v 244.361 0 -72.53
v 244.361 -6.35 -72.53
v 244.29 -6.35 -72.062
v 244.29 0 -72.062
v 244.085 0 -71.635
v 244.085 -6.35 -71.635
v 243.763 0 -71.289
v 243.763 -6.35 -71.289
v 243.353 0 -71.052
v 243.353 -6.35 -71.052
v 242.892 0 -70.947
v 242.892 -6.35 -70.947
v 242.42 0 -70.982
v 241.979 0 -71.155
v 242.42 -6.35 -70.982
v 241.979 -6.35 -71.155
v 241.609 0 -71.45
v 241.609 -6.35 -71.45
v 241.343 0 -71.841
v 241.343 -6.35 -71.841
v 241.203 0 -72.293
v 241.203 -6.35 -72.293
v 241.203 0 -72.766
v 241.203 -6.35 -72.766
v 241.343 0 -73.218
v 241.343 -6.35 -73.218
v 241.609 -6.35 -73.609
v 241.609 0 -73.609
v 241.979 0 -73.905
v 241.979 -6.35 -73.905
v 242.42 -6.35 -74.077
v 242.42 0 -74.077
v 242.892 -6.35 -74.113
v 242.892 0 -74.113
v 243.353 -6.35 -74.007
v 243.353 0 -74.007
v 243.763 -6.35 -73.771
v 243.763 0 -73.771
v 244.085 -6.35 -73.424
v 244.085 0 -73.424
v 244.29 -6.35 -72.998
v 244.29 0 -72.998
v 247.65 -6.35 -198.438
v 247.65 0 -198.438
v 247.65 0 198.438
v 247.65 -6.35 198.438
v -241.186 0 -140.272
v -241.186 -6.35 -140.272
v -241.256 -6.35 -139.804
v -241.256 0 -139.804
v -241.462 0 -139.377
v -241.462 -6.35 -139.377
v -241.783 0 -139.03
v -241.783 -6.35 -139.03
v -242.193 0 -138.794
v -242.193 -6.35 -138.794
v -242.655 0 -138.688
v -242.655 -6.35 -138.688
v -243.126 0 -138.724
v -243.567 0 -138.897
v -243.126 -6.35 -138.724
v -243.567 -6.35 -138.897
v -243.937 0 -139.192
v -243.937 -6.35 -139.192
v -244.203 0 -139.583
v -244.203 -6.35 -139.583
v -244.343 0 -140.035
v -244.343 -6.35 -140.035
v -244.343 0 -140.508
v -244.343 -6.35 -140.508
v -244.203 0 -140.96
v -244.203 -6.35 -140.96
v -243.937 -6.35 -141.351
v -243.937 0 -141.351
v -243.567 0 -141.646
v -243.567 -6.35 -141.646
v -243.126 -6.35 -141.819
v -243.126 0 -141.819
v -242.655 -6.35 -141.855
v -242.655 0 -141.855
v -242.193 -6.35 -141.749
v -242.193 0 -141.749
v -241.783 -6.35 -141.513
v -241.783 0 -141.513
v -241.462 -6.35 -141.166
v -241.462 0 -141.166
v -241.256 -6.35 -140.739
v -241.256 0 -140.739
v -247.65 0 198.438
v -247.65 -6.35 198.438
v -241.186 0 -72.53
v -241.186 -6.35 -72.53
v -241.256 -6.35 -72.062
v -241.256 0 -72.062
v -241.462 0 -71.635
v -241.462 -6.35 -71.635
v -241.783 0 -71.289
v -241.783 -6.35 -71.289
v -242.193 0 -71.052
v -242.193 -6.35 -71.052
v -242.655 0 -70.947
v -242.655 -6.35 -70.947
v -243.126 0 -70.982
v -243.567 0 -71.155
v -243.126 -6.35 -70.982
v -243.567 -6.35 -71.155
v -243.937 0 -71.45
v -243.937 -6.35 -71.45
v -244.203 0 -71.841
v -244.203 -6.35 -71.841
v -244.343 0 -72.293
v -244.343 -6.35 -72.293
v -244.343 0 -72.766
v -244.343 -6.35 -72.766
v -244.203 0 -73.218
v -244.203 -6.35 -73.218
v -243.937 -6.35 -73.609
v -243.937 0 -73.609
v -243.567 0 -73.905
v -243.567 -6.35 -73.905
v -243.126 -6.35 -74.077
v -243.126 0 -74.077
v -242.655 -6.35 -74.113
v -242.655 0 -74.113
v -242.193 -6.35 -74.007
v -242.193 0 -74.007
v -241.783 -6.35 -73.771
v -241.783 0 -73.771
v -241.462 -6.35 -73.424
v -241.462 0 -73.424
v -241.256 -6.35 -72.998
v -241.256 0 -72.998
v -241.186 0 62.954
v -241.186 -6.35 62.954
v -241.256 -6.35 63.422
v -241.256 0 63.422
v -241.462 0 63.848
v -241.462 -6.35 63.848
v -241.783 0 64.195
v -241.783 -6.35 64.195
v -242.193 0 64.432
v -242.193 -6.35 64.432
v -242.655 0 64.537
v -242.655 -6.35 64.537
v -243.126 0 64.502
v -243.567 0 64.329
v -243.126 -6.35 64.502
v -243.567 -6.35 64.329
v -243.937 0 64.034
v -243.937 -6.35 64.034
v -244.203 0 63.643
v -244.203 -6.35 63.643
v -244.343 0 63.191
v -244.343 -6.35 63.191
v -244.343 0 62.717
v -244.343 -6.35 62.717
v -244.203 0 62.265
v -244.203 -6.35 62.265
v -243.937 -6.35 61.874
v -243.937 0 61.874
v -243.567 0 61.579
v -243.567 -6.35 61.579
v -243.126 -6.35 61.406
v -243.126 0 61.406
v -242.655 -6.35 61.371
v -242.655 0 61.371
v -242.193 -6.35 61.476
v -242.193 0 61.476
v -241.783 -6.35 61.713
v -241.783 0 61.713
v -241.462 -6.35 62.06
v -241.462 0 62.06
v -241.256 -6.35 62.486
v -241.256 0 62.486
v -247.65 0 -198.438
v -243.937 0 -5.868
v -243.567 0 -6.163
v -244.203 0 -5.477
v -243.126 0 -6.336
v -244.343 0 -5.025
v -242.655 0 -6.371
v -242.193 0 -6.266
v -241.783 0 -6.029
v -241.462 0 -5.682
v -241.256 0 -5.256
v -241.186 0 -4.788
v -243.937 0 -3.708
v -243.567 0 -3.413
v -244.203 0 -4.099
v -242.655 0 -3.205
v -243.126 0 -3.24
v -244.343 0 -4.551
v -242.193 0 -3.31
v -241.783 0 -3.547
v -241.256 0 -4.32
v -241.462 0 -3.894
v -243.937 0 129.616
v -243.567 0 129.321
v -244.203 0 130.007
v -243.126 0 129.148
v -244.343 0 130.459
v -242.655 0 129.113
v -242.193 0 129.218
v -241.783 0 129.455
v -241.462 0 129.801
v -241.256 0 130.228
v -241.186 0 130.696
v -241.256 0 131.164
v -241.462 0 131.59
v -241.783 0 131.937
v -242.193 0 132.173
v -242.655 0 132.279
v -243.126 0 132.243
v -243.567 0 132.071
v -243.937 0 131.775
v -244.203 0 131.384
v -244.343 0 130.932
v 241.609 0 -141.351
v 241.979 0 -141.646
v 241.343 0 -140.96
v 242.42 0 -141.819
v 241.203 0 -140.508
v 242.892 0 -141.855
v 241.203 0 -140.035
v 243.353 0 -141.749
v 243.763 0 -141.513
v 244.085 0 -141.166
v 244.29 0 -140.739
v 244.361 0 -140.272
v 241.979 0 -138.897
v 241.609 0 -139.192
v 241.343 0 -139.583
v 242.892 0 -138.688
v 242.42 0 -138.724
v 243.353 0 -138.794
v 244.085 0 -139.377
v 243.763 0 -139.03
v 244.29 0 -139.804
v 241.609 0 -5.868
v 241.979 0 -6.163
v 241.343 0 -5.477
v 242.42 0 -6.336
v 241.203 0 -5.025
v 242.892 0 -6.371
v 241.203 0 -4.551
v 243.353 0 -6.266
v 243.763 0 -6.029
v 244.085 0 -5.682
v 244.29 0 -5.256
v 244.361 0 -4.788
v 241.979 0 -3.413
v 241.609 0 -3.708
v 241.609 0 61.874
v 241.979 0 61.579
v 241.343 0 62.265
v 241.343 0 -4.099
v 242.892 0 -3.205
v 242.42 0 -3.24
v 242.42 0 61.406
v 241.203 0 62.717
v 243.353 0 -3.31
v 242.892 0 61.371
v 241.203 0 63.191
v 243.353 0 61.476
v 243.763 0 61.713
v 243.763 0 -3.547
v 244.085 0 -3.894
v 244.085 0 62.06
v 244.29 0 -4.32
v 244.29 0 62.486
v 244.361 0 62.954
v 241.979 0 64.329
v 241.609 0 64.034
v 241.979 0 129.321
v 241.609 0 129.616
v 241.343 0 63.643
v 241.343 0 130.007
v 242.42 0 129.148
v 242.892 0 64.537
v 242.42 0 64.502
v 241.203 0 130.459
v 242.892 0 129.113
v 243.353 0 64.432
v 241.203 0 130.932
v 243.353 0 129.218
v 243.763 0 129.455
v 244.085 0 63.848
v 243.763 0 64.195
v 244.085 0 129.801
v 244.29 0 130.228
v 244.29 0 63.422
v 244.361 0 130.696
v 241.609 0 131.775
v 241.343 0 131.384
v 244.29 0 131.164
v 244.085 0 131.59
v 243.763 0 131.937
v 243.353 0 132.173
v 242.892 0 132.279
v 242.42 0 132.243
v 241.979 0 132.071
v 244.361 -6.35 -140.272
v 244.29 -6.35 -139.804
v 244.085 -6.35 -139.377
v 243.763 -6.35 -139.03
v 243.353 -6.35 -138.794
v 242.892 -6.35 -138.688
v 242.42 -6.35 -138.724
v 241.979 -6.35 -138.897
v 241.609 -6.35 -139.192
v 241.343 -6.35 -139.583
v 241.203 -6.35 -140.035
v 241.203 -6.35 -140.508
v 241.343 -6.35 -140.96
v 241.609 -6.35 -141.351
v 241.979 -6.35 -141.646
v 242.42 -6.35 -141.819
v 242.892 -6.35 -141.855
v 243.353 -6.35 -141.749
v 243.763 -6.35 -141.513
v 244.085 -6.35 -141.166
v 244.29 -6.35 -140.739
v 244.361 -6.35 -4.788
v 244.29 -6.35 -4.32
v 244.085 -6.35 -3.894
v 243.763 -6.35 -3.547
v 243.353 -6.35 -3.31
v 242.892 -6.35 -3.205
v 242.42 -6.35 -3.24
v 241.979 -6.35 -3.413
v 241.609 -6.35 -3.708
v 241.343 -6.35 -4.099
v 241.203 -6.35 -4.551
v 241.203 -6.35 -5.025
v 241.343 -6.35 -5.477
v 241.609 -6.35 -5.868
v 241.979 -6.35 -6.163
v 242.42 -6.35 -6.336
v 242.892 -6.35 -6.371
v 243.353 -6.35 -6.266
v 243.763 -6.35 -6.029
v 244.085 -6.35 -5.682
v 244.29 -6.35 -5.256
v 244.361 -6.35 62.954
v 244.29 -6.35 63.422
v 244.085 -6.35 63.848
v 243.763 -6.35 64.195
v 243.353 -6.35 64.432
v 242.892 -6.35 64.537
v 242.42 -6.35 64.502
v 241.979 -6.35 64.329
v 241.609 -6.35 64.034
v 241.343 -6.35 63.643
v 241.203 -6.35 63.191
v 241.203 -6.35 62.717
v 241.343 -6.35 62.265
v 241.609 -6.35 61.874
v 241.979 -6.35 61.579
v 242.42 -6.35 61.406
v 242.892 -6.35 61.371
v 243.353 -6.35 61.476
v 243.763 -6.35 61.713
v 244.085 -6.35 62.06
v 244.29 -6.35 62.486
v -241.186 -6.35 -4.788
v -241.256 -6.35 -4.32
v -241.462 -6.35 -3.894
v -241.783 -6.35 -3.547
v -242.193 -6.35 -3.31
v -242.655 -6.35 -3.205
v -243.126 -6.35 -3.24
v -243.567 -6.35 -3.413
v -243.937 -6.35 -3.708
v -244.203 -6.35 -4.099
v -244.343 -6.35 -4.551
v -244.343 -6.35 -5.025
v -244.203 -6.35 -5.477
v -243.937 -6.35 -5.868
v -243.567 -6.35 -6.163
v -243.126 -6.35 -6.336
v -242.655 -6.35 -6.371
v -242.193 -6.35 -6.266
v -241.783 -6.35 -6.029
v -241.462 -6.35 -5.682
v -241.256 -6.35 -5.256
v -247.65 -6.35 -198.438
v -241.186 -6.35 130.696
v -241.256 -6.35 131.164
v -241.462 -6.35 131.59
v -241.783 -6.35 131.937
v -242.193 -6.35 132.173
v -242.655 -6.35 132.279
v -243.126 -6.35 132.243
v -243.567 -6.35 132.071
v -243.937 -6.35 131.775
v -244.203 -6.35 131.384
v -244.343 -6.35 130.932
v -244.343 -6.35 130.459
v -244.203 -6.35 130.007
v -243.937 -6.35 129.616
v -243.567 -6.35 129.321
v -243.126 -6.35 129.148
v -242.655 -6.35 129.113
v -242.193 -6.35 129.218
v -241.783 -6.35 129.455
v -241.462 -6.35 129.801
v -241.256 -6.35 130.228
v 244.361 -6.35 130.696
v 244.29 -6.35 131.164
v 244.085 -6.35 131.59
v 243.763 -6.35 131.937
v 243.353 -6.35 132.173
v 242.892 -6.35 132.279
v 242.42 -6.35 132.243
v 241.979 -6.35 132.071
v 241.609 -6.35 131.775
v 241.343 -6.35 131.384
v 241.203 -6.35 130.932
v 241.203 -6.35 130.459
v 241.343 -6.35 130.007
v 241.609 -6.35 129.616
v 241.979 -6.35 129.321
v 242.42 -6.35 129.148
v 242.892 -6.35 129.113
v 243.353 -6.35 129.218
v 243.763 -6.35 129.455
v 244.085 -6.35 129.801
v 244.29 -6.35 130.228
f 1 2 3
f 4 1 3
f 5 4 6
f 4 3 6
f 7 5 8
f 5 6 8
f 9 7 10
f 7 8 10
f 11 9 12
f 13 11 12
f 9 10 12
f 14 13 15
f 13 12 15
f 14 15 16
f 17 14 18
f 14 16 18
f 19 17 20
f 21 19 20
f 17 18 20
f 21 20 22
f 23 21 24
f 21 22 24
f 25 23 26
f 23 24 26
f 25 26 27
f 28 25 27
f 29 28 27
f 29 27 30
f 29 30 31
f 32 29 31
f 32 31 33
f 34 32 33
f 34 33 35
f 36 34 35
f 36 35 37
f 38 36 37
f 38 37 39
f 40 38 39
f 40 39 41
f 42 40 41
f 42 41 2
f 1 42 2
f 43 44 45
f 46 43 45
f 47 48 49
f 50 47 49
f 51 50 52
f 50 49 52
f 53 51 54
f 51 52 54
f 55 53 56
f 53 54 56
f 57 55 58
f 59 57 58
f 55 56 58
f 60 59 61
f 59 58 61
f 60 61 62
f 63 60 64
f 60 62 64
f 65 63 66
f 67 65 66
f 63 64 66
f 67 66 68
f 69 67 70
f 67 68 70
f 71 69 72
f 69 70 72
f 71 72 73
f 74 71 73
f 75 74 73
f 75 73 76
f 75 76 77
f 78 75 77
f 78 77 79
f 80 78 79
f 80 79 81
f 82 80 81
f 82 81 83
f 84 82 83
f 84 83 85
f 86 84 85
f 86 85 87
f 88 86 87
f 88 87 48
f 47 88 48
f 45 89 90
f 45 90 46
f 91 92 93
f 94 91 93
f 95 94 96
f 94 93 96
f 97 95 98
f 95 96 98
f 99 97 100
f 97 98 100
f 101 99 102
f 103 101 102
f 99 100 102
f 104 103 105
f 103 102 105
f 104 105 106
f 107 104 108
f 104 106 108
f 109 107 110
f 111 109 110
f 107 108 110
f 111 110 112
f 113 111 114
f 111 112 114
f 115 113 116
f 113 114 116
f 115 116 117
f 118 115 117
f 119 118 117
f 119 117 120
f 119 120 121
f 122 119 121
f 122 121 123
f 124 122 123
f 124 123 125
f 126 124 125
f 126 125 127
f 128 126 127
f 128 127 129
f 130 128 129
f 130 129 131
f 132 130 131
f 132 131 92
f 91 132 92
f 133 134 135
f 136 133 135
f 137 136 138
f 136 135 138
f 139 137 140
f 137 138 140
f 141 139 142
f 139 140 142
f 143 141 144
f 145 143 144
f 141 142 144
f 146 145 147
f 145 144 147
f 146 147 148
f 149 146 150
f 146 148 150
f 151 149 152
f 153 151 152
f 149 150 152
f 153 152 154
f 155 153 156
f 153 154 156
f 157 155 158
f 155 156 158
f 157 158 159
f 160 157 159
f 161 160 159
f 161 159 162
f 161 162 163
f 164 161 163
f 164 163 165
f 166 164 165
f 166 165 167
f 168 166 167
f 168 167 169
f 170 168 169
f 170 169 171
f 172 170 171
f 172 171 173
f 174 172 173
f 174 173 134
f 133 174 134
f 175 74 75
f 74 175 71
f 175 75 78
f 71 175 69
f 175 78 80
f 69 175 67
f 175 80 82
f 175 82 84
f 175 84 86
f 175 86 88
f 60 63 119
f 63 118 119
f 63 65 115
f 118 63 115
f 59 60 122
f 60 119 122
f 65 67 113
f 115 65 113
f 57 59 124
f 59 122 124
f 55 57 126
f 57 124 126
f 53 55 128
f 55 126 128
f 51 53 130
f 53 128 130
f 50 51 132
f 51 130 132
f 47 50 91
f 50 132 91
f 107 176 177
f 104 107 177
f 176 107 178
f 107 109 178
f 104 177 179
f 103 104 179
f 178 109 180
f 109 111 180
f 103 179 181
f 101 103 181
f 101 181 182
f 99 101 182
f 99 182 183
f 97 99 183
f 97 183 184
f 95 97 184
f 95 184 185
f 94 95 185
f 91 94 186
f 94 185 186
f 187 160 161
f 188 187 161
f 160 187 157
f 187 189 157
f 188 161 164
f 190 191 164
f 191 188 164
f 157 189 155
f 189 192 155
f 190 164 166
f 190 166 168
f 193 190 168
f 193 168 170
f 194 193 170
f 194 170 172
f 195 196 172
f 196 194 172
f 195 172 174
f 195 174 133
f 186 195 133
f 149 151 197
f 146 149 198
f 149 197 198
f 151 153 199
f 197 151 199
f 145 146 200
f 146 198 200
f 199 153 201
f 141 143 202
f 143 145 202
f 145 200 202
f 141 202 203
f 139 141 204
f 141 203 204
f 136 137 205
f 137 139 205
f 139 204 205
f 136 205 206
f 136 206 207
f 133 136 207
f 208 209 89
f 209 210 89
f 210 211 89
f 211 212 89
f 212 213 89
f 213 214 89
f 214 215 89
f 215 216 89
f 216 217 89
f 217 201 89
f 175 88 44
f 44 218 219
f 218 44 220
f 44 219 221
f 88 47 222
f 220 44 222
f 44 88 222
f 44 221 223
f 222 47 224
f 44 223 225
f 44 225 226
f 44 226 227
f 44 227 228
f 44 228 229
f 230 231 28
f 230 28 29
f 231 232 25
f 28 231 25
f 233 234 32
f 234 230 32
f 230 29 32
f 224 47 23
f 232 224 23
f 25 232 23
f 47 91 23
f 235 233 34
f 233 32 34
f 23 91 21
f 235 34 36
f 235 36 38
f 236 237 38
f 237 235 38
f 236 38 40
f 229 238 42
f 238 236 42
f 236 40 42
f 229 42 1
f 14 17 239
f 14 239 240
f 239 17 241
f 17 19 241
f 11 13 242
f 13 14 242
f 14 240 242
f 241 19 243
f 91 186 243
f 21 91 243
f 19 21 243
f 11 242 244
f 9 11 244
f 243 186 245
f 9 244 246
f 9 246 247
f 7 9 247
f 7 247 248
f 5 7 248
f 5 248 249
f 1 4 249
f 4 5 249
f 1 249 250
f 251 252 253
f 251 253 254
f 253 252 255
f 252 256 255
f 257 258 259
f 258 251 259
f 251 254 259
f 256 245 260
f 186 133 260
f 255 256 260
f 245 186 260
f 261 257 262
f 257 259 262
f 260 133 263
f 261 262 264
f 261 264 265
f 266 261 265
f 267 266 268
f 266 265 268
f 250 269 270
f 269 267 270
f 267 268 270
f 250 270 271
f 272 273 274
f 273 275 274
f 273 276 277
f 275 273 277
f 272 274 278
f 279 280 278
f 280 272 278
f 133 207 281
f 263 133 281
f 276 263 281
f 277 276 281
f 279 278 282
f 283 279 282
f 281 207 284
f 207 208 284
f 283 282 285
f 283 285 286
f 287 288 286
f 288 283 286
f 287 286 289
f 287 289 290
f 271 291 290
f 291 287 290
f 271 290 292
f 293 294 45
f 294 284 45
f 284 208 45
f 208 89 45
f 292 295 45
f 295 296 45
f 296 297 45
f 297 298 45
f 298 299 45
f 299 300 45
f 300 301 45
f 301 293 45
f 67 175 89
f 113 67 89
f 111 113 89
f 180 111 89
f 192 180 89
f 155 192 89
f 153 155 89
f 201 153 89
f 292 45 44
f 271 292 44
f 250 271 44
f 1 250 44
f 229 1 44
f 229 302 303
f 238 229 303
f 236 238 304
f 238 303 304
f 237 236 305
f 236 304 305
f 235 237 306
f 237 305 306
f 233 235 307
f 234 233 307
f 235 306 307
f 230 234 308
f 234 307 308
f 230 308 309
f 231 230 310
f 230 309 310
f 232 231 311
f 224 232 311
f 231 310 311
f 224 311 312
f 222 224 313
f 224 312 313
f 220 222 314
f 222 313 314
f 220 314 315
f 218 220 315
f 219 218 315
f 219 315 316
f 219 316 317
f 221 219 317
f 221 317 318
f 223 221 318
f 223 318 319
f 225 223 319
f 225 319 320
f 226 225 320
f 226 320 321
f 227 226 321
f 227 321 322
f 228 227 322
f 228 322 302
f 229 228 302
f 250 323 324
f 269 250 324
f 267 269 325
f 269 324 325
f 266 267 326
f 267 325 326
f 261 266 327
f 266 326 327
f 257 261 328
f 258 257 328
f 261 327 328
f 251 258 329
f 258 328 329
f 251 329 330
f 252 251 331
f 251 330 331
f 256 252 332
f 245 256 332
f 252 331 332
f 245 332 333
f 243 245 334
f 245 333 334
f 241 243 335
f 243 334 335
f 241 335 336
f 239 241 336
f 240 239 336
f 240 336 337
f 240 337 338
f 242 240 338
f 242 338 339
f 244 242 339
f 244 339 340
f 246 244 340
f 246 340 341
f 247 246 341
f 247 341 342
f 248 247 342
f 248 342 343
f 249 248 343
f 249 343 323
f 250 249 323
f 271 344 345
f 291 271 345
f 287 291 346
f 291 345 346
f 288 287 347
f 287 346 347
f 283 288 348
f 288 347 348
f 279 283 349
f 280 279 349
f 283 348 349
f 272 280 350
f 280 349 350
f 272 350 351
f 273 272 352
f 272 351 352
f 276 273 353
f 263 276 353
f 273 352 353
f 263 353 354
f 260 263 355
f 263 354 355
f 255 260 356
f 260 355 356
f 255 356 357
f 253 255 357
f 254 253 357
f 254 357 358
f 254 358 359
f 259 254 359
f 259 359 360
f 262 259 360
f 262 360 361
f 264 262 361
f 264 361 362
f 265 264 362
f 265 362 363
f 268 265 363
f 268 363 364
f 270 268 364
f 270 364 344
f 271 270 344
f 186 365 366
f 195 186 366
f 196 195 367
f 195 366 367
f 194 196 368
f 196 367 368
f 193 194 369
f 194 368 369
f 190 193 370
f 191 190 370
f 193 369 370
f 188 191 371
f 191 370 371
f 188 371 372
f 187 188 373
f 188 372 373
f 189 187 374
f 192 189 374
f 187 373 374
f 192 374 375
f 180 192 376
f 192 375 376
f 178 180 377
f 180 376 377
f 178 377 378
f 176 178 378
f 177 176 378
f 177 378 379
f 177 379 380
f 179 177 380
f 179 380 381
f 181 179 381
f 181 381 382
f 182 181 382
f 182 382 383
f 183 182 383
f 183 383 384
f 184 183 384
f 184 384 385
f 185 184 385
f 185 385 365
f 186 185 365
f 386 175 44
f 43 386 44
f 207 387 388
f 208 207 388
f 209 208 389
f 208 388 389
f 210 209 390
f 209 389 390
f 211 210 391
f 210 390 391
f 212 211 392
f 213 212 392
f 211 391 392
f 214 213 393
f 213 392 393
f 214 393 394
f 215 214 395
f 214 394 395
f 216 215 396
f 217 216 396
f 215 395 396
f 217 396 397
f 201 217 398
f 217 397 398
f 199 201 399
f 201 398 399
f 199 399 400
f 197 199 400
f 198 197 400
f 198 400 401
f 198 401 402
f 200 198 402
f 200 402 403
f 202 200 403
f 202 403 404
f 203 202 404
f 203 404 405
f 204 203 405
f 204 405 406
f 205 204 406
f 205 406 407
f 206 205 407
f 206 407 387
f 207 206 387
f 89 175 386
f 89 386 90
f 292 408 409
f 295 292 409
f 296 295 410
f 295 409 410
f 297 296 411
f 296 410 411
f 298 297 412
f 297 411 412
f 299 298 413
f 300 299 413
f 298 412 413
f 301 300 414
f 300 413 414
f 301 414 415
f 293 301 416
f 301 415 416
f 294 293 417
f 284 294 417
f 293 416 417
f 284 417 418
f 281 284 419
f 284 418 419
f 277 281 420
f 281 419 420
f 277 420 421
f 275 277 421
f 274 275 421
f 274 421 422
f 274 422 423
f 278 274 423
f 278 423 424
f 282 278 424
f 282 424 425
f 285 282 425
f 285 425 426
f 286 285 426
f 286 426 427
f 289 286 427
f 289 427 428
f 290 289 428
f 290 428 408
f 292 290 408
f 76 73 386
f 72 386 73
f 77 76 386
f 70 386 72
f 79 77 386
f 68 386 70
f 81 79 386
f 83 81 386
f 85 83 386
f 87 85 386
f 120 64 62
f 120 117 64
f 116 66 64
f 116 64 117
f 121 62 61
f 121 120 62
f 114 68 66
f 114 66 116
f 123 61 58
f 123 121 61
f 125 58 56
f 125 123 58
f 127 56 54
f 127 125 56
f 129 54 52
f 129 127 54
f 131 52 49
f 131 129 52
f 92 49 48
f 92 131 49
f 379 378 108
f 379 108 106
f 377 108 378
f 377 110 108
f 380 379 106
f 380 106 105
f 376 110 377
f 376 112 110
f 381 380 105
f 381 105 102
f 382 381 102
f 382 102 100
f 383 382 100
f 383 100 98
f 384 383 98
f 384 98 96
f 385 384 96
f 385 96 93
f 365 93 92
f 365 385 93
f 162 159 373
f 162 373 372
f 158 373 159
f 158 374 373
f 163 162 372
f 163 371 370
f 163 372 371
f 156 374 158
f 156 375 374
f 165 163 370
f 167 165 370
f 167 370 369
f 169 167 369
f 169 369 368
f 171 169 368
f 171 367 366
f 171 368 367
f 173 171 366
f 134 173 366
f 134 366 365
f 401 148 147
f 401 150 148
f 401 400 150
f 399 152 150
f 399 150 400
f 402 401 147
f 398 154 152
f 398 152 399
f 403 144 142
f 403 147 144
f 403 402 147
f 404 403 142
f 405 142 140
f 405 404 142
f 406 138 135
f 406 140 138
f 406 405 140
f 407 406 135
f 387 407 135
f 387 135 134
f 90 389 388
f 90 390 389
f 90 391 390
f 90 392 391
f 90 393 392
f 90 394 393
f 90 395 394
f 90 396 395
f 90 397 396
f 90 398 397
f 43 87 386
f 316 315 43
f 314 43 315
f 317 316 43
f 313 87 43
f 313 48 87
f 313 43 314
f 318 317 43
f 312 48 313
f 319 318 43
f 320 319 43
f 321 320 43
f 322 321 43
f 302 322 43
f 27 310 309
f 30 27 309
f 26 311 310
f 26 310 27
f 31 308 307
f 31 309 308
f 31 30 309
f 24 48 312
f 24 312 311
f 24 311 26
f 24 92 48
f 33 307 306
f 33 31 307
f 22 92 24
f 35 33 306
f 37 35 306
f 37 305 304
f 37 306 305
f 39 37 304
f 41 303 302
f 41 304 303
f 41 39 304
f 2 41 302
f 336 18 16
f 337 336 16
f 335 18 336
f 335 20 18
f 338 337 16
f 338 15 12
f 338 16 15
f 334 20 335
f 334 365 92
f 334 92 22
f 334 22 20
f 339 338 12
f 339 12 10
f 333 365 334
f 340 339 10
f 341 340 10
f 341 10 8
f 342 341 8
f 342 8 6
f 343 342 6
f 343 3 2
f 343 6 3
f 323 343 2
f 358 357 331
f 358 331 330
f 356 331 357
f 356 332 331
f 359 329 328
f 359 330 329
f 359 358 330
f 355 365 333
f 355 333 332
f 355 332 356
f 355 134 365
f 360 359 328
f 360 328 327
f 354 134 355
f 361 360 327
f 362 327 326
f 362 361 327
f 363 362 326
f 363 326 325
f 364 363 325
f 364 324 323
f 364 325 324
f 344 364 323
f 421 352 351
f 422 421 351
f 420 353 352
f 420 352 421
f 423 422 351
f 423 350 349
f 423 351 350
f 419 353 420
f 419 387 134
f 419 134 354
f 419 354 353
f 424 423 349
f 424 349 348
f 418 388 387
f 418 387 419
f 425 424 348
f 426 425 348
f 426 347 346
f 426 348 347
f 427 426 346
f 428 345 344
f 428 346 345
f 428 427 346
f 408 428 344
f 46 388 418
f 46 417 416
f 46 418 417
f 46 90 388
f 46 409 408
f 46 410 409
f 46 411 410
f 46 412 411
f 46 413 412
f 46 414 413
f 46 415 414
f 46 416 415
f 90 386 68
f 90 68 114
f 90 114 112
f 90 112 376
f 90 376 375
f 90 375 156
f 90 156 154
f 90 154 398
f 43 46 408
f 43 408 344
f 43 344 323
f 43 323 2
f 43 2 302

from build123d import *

# Parameters (mm, degrees)
F0_W     = 495.3
F0_H     = 396.875
F1_DEPTH = 6.35
F2_R     = 1.5875
F3_DEPTH = 25.4


with BuildPart() as f1:
    # F0 (on Front) → F1 (new body)
    with BuildSketch(Plane.XZ):
        Rectangle(F0_W, F0_H)
    extrude(amount=F1_DEPTH)

    # F2 (on face) → F3 (cut)
    with BuildSketch(Plane.XZ.offset(6.35)):
        with Locations((-242.7732, 130.6957)):
            Circle(F2_R)
        with Locations((-242.7732, 62.9539)):
            Circle(F2_R)
        with Locations((-242.7732, -4.7879)):
            Circle(F2_R)
        with Locations((-242.7732, -72.5297)):
            Circle(F2_R)
        with Locations((-242.7732, -140.2715)):
            Circle(F2_R)
        with Locations((242.7732, 130.6957)):
            Circle(F2_R)
        with Locations((242.7732, 62.9539)):
            Circle(F2_R)
        with Locations((242.7732, -4.7879)):
            Circle(F2_R)
        with Locations((242.7732, -72.5297)):
            Circle(F2_R)
        with Locations((242.7732, -140.2715)):
            Circle(F2_R)
    extrude(amount=-F3_DEPTH, mode=Mode.SUBTRACT)


solid = f1.part
